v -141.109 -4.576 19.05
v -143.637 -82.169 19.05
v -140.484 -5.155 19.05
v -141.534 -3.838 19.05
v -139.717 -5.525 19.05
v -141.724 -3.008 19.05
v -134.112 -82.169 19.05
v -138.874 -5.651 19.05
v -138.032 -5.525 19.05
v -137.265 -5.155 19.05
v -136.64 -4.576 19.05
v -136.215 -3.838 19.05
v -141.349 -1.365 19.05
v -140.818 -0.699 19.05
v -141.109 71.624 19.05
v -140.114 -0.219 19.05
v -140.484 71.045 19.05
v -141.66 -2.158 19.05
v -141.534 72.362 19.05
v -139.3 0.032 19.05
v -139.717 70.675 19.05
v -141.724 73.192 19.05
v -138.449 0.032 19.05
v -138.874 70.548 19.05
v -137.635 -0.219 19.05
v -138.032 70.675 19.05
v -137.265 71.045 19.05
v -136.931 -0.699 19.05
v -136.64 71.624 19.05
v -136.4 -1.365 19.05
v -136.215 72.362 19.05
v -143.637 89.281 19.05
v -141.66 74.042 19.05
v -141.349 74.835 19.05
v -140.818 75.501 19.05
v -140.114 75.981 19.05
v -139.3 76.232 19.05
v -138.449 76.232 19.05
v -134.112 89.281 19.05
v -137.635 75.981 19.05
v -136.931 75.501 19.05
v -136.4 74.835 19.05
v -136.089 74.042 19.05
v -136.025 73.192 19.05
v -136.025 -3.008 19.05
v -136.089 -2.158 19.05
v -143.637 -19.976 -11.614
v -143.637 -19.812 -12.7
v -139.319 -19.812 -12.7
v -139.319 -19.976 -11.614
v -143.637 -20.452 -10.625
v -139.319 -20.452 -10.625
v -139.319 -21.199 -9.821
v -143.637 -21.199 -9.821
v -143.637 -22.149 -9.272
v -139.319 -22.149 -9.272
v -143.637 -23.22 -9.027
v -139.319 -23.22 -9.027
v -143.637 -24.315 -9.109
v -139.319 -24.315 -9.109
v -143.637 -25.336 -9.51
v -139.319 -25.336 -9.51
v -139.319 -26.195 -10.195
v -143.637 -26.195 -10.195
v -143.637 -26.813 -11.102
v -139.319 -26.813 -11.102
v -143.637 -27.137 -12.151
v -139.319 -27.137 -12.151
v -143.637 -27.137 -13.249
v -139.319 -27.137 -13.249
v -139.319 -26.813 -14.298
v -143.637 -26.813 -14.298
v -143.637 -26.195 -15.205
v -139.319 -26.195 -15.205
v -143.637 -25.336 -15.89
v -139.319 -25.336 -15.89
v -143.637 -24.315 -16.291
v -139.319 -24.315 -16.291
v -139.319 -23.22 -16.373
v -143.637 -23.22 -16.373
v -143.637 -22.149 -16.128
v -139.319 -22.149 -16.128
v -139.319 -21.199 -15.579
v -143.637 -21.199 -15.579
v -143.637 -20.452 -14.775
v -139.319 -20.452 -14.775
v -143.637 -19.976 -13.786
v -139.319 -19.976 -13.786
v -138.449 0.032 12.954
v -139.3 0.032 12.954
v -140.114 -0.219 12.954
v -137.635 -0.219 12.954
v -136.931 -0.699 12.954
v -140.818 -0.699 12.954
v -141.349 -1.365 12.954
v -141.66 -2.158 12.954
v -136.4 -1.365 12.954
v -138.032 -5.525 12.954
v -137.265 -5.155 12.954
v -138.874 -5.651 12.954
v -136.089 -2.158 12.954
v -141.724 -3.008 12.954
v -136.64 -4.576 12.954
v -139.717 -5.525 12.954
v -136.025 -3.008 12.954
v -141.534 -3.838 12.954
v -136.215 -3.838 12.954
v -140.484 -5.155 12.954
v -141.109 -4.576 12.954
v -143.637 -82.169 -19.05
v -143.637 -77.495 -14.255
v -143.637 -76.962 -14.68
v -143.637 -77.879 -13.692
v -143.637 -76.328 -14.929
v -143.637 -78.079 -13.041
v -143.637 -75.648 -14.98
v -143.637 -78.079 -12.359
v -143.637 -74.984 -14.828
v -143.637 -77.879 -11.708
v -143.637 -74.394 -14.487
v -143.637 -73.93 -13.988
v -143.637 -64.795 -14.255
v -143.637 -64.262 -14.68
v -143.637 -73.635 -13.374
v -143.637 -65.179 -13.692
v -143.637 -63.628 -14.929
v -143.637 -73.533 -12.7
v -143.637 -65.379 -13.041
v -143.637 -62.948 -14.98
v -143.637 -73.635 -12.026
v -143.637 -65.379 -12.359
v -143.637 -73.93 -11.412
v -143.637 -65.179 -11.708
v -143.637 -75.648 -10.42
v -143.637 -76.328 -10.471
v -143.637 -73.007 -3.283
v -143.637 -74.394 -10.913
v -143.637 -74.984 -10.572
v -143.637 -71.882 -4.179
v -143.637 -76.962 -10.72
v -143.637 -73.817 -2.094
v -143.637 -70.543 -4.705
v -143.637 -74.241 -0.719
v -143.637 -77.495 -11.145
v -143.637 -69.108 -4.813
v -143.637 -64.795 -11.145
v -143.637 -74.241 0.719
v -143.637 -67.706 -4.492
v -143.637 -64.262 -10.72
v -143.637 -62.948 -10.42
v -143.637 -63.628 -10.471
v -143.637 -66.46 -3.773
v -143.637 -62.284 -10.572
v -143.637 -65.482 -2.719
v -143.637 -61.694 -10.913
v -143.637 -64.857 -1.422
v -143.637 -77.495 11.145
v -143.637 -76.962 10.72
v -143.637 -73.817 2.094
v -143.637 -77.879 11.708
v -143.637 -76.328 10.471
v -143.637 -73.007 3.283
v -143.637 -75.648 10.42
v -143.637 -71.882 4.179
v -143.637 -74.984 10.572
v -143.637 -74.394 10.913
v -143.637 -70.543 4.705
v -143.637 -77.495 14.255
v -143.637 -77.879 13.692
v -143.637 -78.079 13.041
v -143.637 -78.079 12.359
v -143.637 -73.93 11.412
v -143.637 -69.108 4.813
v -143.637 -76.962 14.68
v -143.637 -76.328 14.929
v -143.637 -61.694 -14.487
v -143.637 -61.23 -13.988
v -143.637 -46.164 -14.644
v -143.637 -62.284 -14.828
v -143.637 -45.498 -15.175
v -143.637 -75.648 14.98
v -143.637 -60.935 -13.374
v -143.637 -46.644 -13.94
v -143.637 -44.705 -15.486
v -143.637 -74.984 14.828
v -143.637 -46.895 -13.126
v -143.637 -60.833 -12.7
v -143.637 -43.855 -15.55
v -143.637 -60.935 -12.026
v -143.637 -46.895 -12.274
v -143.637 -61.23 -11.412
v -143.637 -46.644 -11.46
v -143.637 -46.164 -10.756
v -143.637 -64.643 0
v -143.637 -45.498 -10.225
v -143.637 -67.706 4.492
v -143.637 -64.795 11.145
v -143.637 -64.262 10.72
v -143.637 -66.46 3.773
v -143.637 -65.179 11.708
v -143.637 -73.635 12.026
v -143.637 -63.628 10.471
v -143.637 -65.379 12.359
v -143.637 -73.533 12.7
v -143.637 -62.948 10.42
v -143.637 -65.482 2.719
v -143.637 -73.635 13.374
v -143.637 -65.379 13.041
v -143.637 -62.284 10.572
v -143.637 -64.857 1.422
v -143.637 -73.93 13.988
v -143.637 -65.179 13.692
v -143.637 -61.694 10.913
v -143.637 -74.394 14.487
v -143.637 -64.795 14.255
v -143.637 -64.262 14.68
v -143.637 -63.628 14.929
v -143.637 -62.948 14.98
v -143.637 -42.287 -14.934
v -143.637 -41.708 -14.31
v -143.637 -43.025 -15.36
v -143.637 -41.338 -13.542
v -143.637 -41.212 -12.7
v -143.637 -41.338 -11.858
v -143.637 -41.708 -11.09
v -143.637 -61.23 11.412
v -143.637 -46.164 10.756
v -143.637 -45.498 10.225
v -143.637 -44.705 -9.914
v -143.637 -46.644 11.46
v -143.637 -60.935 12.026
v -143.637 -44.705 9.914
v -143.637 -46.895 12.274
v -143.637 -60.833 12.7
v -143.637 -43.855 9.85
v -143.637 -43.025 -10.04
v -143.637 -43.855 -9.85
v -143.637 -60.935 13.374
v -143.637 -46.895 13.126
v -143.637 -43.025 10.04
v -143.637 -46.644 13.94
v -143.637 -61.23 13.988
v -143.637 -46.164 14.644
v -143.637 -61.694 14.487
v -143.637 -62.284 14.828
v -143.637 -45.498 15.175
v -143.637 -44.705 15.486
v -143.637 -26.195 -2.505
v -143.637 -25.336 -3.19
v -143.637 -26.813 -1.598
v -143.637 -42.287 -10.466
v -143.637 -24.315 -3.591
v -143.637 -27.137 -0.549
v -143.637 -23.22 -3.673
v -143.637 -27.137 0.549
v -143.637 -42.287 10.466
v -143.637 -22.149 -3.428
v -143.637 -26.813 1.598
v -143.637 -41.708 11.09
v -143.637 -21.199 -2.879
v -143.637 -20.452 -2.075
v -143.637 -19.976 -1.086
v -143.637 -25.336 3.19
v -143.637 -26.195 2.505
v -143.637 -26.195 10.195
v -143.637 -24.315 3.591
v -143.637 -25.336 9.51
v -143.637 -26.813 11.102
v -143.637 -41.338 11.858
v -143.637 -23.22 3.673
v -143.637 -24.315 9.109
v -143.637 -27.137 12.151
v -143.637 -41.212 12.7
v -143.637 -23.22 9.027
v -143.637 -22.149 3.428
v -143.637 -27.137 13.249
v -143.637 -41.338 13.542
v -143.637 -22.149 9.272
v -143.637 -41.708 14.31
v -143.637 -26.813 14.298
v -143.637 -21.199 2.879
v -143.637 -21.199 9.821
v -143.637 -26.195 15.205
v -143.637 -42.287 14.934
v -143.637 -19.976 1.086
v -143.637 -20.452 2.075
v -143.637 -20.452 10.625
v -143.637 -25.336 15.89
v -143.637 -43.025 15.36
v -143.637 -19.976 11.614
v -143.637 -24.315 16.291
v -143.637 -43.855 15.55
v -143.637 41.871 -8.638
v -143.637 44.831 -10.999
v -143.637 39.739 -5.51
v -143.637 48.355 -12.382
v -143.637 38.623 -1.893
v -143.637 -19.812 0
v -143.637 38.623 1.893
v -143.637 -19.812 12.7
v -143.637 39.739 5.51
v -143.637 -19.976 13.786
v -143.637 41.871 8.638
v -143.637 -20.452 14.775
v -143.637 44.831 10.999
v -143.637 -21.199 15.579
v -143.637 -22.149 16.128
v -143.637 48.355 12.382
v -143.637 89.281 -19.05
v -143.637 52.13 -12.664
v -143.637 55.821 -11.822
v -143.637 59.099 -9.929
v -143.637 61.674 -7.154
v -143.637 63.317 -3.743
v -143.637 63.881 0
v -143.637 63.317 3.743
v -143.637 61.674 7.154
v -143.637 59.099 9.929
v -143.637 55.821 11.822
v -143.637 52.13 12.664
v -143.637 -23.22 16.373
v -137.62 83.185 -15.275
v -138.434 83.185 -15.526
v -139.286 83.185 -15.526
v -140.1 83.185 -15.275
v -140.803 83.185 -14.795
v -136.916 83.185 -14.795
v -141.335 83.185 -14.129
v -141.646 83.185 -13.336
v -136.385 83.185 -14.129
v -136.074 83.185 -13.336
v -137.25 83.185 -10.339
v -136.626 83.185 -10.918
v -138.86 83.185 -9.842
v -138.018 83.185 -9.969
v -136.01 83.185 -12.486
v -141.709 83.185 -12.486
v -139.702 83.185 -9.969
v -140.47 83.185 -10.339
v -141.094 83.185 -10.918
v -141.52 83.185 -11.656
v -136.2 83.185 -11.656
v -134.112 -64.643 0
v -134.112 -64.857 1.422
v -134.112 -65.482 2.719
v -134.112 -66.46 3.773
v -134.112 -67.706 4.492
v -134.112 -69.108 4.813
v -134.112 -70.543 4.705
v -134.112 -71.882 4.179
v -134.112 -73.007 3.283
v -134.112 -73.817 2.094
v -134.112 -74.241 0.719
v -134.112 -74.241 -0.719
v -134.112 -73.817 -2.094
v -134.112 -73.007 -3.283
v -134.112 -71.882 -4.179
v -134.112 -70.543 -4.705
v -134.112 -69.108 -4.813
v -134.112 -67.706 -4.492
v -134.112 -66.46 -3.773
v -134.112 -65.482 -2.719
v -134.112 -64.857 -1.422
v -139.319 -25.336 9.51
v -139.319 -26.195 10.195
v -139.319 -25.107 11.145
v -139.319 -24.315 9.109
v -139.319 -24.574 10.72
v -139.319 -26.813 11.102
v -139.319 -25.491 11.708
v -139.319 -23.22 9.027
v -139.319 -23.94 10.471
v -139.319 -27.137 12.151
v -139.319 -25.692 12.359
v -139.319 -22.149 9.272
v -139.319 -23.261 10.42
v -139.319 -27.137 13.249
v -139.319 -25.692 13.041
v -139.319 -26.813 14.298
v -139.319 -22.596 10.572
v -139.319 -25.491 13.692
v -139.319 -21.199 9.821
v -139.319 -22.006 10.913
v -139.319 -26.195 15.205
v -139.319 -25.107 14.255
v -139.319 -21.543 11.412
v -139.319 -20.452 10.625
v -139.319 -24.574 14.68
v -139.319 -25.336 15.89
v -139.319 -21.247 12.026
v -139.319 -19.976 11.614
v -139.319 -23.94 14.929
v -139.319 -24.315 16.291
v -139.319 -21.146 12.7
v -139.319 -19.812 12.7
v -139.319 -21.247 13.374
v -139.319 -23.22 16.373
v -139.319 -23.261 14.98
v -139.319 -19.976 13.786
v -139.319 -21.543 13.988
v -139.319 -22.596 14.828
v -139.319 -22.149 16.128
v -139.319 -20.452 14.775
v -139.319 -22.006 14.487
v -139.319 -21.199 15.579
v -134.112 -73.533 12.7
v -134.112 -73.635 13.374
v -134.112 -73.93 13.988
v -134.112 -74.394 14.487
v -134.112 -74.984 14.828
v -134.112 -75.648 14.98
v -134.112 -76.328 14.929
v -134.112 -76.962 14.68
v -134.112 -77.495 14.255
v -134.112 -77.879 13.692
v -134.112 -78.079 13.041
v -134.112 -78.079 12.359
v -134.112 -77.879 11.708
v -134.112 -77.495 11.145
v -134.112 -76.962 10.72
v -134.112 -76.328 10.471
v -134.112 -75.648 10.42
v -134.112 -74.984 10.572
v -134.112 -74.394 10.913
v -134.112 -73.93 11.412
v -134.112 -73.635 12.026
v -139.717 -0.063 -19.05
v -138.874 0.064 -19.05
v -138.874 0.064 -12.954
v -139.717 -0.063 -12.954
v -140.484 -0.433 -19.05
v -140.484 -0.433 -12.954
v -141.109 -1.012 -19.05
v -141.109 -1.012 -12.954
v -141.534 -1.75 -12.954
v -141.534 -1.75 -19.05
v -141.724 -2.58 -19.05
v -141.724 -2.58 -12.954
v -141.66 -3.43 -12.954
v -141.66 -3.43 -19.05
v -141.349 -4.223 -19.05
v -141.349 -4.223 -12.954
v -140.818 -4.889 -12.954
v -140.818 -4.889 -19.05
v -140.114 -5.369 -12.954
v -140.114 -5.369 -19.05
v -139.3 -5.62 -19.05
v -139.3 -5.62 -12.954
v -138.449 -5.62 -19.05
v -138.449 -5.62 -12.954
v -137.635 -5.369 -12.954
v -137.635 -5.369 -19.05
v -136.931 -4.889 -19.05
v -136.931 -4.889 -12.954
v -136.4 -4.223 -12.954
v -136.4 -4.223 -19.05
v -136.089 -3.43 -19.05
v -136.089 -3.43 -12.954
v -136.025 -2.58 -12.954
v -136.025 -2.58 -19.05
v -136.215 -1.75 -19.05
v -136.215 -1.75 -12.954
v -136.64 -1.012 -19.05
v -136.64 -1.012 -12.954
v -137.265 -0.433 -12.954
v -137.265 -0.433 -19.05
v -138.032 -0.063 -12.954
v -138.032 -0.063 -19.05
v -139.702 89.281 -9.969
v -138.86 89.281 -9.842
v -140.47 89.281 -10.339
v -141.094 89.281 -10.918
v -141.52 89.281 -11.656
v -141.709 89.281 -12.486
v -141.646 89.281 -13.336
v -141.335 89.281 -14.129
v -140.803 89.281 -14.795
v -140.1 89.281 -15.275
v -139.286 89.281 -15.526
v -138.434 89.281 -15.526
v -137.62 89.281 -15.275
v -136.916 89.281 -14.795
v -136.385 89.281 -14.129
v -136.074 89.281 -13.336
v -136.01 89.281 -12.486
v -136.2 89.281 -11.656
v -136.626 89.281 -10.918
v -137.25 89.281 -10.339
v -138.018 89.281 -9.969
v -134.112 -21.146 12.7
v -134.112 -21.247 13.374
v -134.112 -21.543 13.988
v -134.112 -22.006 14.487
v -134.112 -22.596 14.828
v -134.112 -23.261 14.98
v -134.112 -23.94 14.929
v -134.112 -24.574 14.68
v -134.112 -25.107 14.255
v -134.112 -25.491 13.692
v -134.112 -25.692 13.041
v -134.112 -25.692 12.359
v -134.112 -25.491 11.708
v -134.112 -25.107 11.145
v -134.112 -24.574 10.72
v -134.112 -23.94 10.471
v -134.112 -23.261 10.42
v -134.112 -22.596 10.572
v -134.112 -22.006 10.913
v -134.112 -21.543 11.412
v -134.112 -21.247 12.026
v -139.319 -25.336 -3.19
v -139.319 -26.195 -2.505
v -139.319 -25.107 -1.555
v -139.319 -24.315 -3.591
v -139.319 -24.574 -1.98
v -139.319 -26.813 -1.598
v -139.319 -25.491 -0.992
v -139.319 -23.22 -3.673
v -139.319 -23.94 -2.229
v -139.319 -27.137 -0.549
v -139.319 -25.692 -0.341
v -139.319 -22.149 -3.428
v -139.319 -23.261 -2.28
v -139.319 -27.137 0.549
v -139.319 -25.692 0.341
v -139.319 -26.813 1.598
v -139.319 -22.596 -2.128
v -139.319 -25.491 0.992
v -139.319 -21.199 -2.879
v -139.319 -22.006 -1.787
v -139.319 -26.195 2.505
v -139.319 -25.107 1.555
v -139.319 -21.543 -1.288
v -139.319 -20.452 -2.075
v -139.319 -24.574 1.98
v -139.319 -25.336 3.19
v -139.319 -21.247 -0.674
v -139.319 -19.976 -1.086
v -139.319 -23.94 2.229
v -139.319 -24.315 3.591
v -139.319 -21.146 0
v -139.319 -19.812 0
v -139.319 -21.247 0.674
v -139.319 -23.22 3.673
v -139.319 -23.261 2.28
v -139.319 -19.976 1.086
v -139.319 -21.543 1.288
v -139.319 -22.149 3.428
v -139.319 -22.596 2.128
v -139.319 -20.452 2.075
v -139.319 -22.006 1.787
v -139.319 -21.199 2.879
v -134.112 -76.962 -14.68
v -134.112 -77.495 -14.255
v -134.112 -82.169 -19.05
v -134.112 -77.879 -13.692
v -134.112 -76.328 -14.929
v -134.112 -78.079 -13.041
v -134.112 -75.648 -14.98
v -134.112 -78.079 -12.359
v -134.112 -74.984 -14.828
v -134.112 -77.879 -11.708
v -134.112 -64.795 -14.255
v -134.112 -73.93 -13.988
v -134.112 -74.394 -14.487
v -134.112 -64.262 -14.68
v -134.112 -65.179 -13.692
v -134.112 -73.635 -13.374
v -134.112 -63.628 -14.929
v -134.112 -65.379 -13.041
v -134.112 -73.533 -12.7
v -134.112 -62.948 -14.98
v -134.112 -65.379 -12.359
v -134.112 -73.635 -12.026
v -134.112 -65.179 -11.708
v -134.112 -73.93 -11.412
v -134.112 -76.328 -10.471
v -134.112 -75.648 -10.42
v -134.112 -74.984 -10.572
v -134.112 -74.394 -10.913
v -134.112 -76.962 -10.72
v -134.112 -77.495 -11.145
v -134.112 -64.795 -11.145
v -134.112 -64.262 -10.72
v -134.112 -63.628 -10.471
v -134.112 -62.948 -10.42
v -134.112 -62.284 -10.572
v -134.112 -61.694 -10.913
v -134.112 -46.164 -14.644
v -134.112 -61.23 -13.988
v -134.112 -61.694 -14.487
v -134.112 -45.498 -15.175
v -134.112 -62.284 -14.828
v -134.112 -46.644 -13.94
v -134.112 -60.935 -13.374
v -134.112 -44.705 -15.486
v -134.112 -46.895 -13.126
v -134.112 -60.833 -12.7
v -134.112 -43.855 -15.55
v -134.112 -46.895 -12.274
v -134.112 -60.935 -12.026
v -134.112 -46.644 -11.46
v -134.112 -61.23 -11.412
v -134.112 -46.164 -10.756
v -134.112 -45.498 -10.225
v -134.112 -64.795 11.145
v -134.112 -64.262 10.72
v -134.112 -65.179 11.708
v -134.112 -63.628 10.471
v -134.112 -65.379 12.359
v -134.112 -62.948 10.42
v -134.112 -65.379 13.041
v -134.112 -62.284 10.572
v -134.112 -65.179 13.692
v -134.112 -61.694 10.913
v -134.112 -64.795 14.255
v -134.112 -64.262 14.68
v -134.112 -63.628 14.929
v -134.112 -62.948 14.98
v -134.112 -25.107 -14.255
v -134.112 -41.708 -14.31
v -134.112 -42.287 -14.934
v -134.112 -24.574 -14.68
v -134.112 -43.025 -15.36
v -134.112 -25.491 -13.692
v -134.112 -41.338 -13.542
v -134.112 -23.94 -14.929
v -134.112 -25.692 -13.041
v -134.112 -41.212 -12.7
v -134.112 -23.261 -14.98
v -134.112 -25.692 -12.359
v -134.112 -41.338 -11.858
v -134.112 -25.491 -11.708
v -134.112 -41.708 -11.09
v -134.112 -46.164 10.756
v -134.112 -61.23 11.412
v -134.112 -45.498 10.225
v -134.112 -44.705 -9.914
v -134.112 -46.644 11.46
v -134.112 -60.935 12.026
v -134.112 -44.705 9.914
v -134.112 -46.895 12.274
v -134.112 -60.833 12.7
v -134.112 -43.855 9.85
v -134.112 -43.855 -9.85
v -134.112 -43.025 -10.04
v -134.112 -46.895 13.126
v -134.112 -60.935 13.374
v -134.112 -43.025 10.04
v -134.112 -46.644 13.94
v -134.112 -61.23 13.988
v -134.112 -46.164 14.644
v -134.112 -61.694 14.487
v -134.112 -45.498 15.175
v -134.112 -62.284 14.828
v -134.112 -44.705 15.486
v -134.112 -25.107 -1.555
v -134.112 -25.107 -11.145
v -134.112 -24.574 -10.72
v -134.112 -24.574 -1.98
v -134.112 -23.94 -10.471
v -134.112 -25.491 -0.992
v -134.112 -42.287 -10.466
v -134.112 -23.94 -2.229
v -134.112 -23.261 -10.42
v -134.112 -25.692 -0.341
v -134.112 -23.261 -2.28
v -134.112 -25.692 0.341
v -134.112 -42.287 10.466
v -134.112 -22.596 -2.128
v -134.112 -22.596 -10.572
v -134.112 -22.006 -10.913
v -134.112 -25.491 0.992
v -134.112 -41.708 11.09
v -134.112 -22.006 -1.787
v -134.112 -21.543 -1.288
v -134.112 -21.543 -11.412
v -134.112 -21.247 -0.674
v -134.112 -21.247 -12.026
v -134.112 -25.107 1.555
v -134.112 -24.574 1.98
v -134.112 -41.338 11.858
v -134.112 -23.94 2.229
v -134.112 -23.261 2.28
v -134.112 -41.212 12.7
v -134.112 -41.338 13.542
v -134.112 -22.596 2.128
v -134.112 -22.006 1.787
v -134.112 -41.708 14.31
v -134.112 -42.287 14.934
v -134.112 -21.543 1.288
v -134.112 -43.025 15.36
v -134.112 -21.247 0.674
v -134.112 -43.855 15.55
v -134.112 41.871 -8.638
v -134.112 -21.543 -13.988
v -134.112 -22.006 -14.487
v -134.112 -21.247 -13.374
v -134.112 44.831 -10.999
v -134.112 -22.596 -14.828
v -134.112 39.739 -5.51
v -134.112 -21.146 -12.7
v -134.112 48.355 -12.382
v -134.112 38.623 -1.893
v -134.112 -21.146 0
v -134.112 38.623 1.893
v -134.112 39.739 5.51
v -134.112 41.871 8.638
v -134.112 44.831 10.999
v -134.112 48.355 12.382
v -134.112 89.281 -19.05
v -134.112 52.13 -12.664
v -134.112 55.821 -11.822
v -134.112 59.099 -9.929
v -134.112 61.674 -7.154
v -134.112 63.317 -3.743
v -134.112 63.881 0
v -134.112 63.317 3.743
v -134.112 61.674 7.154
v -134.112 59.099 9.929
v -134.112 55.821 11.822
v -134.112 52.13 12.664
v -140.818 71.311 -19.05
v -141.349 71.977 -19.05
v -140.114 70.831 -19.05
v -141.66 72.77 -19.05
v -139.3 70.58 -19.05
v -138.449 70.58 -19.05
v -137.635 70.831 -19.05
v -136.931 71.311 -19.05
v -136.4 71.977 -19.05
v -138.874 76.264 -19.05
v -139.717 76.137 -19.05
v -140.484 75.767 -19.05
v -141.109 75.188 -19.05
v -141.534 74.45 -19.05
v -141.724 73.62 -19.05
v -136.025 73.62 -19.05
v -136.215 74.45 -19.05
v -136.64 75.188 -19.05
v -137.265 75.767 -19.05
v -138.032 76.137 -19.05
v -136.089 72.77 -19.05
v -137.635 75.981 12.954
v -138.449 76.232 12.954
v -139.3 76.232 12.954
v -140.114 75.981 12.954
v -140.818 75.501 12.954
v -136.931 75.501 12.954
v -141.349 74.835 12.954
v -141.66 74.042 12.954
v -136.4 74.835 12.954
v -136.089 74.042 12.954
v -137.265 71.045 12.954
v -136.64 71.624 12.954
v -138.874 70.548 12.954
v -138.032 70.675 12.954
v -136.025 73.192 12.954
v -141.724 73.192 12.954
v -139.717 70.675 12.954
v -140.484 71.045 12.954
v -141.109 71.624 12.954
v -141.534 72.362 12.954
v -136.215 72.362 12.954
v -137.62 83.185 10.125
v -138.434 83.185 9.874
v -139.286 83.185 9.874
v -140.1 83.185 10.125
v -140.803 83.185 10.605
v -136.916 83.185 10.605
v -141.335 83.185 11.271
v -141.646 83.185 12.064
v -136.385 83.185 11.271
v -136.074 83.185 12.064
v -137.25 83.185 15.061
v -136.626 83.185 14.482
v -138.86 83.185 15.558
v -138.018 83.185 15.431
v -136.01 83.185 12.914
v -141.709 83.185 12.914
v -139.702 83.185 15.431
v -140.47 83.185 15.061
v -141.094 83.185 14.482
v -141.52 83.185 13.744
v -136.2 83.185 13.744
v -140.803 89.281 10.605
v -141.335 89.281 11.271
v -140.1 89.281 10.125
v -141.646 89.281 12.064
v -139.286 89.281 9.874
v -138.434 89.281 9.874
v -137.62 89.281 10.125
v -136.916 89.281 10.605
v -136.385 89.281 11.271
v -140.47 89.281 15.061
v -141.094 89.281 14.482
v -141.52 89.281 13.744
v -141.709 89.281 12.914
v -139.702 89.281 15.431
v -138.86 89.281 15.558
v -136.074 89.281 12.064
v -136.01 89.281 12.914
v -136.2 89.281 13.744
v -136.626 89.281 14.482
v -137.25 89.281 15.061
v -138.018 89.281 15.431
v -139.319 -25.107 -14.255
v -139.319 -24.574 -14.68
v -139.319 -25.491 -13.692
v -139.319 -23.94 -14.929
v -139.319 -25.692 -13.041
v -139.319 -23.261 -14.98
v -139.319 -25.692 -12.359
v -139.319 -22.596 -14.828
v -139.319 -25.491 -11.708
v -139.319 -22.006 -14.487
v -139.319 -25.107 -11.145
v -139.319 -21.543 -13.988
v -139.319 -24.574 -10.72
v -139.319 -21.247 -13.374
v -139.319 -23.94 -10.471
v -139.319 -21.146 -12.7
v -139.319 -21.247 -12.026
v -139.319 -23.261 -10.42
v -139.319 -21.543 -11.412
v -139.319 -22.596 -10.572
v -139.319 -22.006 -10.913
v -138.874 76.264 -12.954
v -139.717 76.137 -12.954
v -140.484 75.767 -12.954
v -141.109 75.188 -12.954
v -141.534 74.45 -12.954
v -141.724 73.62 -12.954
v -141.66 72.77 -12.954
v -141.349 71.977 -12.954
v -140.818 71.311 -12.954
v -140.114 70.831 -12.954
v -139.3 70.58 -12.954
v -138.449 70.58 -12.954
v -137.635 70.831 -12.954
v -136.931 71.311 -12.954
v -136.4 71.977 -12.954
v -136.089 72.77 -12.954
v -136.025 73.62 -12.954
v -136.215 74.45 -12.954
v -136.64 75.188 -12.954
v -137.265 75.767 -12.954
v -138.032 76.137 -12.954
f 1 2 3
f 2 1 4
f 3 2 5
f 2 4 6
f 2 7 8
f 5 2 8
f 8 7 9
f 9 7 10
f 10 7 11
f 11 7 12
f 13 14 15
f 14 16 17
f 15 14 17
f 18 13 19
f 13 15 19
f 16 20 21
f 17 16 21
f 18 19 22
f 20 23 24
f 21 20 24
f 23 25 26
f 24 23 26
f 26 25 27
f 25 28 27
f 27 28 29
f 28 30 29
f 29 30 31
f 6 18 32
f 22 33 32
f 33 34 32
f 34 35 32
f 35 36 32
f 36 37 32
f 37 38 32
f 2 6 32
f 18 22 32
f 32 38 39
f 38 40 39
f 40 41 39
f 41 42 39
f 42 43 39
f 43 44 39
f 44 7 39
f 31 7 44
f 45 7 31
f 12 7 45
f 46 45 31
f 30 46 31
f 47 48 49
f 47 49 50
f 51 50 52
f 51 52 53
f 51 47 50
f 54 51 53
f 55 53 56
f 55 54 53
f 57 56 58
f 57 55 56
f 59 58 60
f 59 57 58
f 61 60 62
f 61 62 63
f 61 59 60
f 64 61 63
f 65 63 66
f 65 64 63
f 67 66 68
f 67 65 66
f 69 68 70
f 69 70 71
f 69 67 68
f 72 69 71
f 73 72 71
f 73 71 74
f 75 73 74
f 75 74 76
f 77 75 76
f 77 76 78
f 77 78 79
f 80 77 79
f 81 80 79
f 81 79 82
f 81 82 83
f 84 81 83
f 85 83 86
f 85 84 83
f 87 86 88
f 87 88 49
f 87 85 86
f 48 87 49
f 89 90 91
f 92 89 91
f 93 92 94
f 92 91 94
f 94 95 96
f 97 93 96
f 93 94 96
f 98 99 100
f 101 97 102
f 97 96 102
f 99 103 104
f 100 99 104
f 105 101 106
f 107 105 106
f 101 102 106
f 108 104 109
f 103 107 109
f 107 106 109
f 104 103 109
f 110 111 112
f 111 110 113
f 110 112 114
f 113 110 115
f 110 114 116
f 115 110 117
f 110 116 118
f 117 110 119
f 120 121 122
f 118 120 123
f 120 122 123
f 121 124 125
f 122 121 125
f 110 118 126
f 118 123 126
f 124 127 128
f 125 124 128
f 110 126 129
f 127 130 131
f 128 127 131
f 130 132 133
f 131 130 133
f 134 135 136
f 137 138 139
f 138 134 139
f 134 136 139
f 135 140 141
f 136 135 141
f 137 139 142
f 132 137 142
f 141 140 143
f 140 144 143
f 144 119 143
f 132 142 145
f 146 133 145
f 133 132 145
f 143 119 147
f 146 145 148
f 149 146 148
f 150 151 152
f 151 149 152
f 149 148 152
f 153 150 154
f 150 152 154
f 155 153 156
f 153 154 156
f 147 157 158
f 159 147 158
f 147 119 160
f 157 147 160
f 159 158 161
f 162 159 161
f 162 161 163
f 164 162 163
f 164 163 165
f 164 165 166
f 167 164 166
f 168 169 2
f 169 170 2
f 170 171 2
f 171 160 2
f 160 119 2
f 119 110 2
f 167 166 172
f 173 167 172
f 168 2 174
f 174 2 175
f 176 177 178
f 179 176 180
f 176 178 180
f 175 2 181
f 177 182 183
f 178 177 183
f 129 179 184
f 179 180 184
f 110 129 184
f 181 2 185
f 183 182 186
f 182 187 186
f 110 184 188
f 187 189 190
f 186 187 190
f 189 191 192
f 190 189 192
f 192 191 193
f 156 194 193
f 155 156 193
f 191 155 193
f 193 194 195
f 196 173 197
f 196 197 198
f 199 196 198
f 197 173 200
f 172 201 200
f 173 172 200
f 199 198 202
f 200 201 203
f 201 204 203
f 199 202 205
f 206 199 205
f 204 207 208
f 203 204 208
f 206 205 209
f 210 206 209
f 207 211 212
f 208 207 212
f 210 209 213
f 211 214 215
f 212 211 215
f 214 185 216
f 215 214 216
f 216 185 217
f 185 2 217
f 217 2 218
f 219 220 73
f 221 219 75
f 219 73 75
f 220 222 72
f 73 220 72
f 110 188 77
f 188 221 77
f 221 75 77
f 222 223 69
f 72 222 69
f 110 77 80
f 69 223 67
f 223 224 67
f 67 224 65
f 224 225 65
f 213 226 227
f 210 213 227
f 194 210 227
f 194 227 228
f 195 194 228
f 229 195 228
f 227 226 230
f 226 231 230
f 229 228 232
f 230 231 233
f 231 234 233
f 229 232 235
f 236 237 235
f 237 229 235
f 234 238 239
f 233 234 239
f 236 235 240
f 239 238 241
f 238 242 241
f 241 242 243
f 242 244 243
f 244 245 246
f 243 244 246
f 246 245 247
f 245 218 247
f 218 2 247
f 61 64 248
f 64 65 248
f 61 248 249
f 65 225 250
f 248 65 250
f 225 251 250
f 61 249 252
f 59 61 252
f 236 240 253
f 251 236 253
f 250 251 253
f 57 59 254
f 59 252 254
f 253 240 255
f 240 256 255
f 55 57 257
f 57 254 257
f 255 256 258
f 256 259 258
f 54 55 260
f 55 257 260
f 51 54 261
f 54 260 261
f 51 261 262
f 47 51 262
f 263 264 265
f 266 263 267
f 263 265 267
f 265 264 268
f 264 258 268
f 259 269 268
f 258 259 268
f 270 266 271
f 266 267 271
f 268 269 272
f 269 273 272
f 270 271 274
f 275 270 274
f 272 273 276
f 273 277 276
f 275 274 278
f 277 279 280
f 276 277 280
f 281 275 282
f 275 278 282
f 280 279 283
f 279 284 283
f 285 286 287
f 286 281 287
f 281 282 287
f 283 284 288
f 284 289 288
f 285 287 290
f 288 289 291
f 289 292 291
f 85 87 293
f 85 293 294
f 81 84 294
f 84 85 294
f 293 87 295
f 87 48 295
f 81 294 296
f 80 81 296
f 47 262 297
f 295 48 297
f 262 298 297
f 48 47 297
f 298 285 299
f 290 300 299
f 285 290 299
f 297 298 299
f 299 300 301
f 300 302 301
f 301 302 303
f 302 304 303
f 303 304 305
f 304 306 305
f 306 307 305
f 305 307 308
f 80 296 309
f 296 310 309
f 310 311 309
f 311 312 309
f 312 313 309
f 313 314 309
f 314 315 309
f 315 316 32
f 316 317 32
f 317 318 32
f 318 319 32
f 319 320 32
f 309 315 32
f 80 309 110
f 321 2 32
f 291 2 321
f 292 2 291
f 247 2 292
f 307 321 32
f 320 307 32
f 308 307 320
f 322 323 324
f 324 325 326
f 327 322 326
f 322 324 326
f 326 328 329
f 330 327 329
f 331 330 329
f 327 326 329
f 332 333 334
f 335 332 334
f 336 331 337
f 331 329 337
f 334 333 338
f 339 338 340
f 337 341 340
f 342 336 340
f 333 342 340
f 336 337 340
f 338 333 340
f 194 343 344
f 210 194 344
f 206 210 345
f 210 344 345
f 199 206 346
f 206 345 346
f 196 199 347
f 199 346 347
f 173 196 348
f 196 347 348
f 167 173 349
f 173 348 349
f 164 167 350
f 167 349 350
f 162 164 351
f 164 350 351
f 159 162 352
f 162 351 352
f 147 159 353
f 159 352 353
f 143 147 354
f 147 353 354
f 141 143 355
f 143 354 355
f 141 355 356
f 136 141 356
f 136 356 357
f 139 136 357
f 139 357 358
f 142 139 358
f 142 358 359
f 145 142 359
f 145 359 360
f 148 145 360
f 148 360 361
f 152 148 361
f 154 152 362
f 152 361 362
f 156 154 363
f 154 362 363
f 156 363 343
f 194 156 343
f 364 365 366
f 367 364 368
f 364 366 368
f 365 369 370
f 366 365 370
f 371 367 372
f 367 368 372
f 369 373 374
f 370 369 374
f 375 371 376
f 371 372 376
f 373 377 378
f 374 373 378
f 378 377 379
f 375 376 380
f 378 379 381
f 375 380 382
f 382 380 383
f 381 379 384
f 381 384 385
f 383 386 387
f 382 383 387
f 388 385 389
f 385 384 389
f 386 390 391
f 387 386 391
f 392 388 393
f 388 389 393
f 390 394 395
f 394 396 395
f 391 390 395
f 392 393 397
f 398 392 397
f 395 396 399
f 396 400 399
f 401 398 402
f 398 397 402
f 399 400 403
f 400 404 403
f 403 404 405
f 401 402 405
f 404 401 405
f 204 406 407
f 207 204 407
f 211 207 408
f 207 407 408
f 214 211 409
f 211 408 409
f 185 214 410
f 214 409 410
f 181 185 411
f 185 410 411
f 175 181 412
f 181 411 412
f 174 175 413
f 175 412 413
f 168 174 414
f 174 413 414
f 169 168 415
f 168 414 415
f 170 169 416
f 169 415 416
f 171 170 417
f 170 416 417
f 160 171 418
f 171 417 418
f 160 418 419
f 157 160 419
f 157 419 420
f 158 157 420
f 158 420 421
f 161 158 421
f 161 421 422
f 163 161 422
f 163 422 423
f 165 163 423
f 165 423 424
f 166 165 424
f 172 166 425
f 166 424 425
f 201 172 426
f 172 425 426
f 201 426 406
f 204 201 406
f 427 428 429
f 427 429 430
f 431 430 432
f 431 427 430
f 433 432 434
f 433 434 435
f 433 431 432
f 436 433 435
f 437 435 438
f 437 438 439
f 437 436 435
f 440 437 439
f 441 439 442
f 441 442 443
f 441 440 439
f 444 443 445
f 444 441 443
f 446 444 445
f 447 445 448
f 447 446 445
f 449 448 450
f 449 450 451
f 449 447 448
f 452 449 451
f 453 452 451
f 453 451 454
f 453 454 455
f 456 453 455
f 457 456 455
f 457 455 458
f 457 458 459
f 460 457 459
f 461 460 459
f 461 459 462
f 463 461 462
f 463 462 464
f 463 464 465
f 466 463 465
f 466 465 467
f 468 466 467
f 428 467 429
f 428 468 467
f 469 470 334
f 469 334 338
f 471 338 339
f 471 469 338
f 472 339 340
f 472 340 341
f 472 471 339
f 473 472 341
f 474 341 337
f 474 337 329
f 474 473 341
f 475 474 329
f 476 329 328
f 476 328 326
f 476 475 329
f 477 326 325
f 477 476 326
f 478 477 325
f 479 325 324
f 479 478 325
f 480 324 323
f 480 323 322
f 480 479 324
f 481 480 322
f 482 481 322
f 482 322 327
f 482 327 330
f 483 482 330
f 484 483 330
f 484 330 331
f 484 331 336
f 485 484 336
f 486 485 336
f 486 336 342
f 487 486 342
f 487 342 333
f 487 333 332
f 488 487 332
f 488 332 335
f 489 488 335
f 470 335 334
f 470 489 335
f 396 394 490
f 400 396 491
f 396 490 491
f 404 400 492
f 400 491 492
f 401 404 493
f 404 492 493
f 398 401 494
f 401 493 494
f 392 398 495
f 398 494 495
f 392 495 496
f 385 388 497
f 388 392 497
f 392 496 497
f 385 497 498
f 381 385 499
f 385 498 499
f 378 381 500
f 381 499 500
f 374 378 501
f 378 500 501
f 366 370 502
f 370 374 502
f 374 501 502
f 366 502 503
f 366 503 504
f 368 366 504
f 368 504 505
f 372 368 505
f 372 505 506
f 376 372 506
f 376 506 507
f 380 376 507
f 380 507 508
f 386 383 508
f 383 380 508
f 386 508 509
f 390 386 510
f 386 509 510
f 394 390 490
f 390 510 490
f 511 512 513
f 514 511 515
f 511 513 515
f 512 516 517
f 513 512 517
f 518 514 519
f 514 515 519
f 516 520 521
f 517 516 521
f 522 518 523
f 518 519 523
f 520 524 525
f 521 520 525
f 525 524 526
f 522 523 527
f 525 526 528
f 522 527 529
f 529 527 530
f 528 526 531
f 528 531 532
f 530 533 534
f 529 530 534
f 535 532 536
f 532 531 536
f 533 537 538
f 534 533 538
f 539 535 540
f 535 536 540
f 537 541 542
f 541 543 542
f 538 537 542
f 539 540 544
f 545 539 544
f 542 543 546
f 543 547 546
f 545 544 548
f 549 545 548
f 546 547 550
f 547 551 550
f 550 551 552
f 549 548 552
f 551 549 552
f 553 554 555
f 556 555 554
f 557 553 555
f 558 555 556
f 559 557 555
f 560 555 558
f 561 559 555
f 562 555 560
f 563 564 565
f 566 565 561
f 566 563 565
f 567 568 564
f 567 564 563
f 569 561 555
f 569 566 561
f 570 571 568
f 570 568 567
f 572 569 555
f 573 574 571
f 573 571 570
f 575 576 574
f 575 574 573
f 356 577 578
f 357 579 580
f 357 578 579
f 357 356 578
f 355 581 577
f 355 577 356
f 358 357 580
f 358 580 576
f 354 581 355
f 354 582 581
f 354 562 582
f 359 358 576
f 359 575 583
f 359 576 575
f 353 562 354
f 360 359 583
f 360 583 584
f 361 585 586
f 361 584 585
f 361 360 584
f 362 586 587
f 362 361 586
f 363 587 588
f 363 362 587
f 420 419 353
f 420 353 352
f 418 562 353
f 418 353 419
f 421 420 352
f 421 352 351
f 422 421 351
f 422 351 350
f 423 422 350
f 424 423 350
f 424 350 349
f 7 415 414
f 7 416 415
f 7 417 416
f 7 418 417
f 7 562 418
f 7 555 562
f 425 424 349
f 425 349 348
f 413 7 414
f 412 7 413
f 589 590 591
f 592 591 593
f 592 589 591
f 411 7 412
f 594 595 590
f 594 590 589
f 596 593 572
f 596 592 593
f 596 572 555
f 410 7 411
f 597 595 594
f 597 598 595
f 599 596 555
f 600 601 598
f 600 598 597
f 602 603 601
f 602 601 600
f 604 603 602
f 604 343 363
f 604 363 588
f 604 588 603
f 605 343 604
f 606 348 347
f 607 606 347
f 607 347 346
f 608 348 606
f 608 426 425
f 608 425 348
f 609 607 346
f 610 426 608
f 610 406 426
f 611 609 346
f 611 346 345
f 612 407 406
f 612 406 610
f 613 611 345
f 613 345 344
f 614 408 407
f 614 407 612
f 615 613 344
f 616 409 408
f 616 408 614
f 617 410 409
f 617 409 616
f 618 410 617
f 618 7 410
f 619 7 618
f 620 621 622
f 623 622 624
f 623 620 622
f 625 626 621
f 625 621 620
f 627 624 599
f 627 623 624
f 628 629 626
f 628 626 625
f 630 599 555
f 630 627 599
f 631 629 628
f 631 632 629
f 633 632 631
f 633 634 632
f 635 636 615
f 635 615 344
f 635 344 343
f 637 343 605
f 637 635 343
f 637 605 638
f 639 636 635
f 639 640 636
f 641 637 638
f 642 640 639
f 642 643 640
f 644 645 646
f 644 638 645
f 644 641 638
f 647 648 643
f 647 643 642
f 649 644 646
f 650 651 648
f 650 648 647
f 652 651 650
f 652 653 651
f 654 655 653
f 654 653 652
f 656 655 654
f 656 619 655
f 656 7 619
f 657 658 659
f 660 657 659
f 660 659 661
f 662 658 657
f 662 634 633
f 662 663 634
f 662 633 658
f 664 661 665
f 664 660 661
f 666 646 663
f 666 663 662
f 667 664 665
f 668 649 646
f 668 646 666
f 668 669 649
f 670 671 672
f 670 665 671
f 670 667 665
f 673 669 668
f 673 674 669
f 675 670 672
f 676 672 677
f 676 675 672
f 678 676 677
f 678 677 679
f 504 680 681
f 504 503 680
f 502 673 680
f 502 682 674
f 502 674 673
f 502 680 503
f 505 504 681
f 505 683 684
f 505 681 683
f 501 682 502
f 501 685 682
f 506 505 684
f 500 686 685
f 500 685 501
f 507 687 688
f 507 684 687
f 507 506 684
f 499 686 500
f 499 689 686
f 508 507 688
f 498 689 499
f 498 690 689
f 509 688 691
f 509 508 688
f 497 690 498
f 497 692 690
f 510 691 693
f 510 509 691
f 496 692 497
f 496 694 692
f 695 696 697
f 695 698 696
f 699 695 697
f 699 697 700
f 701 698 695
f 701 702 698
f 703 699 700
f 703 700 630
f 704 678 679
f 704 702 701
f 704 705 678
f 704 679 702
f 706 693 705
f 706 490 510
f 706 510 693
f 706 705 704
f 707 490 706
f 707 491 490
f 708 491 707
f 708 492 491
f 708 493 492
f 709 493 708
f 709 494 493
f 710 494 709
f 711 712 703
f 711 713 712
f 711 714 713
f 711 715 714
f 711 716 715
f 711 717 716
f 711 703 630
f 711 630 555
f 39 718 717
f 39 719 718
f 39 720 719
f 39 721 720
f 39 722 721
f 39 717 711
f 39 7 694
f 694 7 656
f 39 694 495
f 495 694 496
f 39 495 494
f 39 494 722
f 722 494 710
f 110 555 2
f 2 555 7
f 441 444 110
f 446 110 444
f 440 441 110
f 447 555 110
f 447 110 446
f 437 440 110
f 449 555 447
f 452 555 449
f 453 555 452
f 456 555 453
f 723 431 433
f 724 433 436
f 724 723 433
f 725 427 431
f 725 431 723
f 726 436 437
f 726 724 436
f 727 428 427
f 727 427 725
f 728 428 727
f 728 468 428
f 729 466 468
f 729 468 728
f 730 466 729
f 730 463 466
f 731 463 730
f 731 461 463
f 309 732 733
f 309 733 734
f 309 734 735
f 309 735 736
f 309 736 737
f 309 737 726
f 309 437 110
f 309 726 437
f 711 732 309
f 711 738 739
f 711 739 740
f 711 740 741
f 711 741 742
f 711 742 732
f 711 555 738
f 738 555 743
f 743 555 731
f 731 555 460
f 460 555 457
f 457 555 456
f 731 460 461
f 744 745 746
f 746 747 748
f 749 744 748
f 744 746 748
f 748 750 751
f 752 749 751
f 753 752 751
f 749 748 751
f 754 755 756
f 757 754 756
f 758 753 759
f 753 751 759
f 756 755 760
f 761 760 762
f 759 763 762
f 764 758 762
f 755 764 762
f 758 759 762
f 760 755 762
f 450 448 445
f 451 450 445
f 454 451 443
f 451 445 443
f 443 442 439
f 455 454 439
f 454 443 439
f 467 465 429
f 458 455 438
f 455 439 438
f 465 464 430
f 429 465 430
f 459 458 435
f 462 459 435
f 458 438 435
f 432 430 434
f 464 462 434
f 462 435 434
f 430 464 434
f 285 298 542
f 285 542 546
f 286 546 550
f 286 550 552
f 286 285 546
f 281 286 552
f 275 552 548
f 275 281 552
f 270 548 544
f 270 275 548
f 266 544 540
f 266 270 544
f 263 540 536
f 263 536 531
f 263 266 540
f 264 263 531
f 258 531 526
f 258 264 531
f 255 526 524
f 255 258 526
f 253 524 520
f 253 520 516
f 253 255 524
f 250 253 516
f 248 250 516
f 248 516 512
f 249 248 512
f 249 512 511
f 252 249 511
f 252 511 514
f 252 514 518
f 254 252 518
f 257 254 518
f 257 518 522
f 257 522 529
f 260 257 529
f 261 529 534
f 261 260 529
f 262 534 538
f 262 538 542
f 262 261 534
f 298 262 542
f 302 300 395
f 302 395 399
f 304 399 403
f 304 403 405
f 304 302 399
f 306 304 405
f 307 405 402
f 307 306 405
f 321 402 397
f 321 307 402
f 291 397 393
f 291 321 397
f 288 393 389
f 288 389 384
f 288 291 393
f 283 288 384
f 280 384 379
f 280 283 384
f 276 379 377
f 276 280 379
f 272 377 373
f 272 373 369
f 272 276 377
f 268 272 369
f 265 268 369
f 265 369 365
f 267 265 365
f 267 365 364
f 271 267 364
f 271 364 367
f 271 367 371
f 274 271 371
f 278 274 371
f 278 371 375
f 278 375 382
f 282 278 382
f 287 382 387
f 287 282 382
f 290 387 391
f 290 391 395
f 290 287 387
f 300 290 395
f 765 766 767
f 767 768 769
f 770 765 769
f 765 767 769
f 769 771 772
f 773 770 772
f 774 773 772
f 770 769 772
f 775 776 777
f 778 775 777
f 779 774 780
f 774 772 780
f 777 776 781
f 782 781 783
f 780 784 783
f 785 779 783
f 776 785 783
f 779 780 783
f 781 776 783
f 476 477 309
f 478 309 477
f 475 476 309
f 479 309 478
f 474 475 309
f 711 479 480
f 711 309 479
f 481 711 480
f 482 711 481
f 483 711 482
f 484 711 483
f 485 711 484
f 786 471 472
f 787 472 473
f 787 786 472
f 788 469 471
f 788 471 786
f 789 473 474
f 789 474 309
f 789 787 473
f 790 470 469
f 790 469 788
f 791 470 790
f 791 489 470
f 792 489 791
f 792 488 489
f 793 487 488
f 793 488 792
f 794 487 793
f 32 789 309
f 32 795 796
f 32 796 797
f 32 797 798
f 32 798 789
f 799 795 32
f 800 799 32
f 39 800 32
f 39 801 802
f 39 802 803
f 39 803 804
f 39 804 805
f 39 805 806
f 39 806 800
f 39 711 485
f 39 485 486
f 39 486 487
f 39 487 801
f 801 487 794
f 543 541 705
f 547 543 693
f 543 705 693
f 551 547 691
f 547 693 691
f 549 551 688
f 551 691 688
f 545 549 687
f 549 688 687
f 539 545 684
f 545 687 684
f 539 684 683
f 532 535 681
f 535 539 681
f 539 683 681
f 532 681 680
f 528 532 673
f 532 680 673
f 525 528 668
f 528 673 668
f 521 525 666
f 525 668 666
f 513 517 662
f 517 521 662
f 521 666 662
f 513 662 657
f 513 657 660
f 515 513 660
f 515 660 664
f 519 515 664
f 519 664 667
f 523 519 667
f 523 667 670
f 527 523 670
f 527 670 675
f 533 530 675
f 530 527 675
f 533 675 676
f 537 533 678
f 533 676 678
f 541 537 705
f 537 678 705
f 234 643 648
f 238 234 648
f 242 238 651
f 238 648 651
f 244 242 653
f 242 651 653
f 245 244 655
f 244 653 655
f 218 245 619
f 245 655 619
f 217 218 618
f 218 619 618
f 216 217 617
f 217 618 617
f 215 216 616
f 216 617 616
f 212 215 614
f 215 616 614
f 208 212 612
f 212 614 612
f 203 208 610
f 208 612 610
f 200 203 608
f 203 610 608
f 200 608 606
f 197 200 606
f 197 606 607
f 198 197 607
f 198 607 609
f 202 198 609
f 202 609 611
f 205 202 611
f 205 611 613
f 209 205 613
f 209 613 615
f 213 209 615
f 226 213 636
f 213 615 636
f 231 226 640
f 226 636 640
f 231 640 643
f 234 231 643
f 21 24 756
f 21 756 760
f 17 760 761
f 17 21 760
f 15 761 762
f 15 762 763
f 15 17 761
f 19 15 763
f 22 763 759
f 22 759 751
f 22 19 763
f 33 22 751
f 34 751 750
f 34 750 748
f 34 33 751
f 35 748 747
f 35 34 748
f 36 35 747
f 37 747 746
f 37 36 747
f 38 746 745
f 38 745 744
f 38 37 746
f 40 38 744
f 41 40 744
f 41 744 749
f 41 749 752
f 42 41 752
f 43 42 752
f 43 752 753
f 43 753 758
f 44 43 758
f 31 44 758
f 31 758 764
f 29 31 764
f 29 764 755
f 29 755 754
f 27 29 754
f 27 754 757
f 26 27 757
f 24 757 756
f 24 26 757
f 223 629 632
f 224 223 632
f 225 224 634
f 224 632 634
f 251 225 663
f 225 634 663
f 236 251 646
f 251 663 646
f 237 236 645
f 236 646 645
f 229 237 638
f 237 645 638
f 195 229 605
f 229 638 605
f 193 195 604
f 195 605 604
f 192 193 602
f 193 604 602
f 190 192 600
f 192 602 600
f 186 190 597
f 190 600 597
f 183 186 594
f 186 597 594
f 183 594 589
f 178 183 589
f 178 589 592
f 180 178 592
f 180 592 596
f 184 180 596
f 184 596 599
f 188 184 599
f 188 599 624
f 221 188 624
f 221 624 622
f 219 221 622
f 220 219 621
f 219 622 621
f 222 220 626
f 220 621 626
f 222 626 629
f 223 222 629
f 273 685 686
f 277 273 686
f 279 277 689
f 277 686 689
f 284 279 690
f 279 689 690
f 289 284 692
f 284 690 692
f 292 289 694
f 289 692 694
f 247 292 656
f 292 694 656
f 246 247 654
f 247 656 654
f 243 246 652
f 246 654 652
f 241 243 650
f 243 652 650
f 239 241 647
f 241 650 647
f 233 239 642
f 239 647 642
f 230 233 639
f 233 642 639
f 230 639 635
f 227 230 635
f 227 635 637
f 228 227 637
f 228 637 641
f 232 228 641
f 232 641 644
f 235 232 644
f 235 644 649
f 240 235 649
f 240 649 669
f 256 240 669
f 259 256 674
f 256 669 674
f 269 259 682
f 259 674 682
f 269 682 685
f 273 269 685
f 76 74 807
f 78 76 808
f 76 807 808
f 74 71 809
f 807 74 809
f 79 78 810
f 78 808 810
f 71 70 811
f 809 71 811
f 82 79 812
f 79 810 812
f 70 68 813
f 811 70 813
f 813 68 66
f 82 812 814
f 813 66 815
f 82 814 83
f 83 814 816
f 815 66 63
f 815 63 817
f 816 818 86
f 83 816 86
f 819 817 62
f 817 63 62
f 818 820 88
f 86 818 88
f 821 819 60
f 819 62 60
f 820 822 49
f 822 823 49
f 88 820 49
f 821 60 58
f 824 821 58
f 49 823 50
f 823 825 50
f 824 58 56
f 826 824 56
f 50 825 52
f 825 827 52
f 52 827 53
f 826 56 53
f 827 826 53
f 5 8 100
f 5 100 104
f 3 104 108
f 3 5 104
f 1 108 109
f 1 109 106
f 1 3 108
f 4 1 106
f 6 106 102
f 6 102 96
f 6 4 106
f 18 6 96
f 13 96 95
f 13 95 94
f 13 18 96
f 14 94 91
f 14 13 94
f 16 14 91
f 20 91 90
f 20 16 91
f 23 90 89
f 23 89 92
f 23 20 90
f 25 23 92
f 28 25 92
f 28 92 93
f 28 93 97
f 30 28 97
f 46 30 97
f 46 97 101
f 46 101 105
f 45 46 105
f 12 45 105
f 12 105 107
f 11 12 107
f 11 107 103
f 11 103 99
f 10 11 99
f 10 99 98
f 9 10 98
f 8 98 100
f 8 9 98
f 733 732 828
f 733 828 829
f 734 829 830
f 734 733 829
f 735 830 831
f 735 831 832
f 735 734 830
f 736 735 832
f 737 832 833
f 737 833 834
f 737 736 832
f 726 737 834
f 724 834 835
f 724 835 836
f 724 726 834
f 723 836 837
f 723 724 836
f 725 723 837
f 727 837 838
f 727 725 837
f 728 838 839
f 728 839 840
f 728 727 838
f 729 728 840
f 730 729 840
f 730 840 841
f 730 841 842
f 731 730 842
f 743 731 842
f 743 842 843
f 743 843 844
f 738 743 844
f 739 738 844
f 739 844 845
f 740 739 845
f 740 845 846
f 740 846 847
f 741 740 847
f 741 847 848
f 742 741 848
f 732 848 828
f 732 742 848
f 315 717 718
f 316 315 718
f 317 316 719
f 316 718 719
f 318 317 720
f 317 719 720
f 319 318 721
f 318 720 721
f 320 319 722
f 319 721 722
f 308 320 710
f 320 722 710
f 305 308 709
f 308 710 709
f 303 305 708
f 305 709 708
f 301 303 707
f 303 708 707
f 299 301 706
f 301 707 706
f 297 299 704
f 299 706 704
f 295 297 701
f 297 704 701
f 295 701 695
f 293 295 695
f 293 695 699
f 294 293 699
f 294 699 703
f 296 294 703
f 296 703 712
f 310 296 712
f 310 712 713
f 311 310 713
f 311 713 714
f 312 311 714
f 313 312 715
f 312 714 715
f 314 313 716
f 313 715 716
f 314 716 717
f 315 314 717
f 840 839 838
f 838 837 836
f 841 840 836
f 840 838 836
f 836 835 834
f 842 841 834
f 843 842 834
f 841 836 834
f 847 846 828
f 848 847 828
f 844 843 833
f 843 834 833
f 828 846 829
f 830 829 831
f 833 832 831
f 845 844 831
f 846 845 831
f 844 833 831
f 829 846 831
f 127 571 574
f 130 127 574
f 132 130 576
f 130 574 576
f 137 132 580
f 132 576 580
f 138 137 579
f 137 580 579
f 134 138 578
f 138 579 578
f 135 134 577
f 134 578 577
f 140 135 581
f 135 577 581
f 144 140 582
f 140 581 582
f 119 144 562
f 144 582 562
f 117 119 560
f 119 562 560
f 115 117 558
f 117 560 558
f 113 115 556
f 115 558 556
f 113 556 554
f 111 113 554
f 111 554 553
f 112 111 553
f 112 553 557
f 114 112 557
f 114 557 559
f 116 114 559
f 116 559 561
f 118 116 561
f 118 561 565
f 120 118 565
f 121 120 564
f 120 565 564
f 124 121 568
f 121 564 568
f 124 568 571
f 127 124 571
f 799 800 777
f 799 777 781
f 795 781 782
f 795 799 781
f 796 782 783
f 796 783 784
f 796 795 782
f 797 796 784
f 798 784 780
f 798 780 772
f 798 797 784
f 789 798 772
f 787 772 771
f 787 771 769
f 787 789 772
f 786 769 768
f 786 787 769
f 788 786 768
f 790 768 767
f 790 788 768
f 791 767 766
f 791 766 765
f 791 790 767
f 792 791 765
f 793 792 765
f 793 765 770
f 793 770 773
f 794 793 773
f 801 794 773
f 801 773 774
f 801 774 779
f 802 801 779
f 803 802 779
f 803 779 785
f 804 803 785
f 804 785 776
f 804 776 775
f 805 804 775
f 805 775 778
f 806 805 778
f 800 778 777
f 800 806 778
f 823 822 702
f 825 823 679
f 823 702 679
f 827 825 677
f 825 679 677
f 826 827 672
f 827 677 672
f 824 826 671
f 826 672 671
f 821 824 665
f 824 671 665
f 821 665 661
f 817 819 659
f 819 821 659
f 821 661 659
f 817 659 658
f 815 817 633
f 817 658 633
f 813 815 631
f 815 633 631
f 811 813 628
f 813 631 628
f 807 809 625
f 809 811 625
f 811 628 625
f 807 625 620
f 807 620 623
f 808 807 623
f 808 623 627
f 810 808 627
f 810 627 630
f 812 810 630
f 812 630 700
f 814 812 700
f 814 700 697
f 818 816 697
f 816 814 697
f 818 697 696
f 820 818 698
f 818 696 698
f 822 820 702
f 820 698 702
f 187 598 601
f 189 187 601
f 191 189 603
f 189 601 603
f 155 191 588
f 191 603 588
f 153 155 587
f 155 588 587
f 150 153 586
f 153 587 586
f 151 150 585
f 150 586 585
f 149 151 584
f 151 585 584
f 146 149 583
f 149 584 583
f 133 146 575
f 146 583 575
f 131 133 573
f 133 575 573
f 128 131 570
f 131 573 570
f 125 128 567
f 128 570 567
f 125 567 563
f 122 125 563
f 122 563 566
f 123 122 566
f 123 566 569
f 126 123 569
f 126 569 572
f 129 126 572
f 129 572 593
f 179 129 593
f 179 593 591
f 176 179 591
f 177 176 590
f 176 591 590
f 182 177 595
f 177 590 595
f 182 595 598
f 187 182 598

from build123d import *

# Parameters (mm, degrees)
SKETCH_W        = 171.45
SKETCH_H        = 38.1
SKETCH_R        = 4.826
SKETCH_R_2      = 2.286
SKETCH_R_3      = 12.7
SKETCH_R_4      = 2.8575
PAD_DEPTH       = 9.525
SKETCH001_R     = 2.8575
POCKET_DEPTH    = 6.096
SKETCH086_R     = 2.8575
POCKET014_DEPTH = 6.096
SKETCH087_R     = 2.8575
POCKET015_DEPTH = 6.096
SKETCH094_R     = 3.683
POCKET022_DEPTH = 4.318


with BuildPart() as left_wall:
    # Sketch → Pad (new body)
    with BuildSketch(Plane.YZ):
        Rectangle(SKETCH_W, SKETCH_H)
        with Locations((-73.025, 0)):
            Circle(SKETCH_R, mode=Mode.SUBTRACT)
        with Locations((-26.9875, 12.7)):
            Circle(SKETCH_R_2, mode=Mode.SUBTRACT)
        with Locations((-26.9875, -12.7)):
            Circle(SKETCH_R_2, mode=Mode.SUBTRACT)
        with Locations((47.625, 0)):
            Circle(SKETCH_R_3, mode=Mode.SUBTRACT)
        with Locations((-79.375, -12.7)):
            Circle(SKETCH_R_2, mode=Mode.SUBTRACT)
        with Locations((-66.675, -12.7)):
            Circle(SKETCH_R_2, mode=Mode.SUBTRACT)
        with Locations((-47.625, 12.7)):
            Circle(SKETCH_R_4, mode=Mode.SUBTRACT)
        with Locations((-47.625, -12.7)):
            Circle(SKETCH_R_4, mode=Mode.SUBTRACT)
        with Locations((-26.9875, 0)):
            Circle(SKETCH_R_2, mode=Mode.SUBTRACT)
        with Locations((-79.375, 12.7)):
            Circle(SKETCH_R_2, mode=Mode.SUBTRACT)
        with Locations((-66.675, 12.7)):
            Circle(SKETCH_R_2, mode=Mode.SUBTRACT)
    extrude(amount=PAD_DEPTH)

    # Sketch001 (on Face3 of Pad) → Pocket (cut)
    with BuildSketch(Plane.ZX.offset(85.725)):
        with Locations((12.7, 4.74788)):
            Circle(SKETCH001_R)
        with Locations((-12.7, 4.74788)):
            Circle(SKETCH001_R)
    extrude(amount=-POCKET_DEPTH, mode=Mode.SUBTRACT)

    # Sketch086 (on Face2 of Pocket) → Pocket014 (cut)
    with BuildSketch(Plane(origin=(0, 0, 19.05), x_dir=(0, -1, 0), z_dir=(0, 0, 1))):
        with Locations((-69.85, 4.7625)):
            Circle(SKETCH086_R)
        with Locations((6.35, 4.7625)):
            Circle(SKETCH086_R)
    extrude(amount=-POCKET014_DEPTH, mode=Mode.SUBTRACT)

    # Sketch087 (on Face3 of Pocket) → Pocket015 (cut)
    with BuildSketch(Plane.YX.offset(19.05)):
        with Locations((-6.35, 4.7625)):
            Circle(SKETCH087_R)
        with Locations((69.85, 4.7625)):
            Circle(SKETCH087_R)
    extrude(amount=-POCKET015_DEPTH, mode=Mode.SUBTRACT)

    # Sketch094 (on Face5 of Pocket015) → Pocket022 (cut)
    with BuildSketch(Plane.YZ.offset(9.525)):
        with Locations((-27.051, 12.7)):
            Circle(SKETCH094_R)
        with Locations((-27.051, -12.7)):
            Circle(SKETCH094_R)
        with Locations((-27.051, 0)):
            Circle(SKETCH094_R)
    extrude(amount=-POCKET022_DEPTH, mode=Mode.SUBTRACT)


with BuildPart() as left_wall_1:
    # Body placement: moved
    add(left_wall.part.moved(Location((0, 3.556, 0))))


with BuildPart() as right_wall:
    # Part__Mirroring: instance of left-wall
    add(left_wall_1.part.mirror(Plane(origin=(0, 0, 0), x_dir=(0, -1, 0), z_dir=(1, 0, 0))))


with BuildPart() as right_wall_1:
    # Part__Mirroring placement: moved
    add(right_wall.part.moved(Location((-134.112, 0, 0))))


solid = right_wall_1.part
